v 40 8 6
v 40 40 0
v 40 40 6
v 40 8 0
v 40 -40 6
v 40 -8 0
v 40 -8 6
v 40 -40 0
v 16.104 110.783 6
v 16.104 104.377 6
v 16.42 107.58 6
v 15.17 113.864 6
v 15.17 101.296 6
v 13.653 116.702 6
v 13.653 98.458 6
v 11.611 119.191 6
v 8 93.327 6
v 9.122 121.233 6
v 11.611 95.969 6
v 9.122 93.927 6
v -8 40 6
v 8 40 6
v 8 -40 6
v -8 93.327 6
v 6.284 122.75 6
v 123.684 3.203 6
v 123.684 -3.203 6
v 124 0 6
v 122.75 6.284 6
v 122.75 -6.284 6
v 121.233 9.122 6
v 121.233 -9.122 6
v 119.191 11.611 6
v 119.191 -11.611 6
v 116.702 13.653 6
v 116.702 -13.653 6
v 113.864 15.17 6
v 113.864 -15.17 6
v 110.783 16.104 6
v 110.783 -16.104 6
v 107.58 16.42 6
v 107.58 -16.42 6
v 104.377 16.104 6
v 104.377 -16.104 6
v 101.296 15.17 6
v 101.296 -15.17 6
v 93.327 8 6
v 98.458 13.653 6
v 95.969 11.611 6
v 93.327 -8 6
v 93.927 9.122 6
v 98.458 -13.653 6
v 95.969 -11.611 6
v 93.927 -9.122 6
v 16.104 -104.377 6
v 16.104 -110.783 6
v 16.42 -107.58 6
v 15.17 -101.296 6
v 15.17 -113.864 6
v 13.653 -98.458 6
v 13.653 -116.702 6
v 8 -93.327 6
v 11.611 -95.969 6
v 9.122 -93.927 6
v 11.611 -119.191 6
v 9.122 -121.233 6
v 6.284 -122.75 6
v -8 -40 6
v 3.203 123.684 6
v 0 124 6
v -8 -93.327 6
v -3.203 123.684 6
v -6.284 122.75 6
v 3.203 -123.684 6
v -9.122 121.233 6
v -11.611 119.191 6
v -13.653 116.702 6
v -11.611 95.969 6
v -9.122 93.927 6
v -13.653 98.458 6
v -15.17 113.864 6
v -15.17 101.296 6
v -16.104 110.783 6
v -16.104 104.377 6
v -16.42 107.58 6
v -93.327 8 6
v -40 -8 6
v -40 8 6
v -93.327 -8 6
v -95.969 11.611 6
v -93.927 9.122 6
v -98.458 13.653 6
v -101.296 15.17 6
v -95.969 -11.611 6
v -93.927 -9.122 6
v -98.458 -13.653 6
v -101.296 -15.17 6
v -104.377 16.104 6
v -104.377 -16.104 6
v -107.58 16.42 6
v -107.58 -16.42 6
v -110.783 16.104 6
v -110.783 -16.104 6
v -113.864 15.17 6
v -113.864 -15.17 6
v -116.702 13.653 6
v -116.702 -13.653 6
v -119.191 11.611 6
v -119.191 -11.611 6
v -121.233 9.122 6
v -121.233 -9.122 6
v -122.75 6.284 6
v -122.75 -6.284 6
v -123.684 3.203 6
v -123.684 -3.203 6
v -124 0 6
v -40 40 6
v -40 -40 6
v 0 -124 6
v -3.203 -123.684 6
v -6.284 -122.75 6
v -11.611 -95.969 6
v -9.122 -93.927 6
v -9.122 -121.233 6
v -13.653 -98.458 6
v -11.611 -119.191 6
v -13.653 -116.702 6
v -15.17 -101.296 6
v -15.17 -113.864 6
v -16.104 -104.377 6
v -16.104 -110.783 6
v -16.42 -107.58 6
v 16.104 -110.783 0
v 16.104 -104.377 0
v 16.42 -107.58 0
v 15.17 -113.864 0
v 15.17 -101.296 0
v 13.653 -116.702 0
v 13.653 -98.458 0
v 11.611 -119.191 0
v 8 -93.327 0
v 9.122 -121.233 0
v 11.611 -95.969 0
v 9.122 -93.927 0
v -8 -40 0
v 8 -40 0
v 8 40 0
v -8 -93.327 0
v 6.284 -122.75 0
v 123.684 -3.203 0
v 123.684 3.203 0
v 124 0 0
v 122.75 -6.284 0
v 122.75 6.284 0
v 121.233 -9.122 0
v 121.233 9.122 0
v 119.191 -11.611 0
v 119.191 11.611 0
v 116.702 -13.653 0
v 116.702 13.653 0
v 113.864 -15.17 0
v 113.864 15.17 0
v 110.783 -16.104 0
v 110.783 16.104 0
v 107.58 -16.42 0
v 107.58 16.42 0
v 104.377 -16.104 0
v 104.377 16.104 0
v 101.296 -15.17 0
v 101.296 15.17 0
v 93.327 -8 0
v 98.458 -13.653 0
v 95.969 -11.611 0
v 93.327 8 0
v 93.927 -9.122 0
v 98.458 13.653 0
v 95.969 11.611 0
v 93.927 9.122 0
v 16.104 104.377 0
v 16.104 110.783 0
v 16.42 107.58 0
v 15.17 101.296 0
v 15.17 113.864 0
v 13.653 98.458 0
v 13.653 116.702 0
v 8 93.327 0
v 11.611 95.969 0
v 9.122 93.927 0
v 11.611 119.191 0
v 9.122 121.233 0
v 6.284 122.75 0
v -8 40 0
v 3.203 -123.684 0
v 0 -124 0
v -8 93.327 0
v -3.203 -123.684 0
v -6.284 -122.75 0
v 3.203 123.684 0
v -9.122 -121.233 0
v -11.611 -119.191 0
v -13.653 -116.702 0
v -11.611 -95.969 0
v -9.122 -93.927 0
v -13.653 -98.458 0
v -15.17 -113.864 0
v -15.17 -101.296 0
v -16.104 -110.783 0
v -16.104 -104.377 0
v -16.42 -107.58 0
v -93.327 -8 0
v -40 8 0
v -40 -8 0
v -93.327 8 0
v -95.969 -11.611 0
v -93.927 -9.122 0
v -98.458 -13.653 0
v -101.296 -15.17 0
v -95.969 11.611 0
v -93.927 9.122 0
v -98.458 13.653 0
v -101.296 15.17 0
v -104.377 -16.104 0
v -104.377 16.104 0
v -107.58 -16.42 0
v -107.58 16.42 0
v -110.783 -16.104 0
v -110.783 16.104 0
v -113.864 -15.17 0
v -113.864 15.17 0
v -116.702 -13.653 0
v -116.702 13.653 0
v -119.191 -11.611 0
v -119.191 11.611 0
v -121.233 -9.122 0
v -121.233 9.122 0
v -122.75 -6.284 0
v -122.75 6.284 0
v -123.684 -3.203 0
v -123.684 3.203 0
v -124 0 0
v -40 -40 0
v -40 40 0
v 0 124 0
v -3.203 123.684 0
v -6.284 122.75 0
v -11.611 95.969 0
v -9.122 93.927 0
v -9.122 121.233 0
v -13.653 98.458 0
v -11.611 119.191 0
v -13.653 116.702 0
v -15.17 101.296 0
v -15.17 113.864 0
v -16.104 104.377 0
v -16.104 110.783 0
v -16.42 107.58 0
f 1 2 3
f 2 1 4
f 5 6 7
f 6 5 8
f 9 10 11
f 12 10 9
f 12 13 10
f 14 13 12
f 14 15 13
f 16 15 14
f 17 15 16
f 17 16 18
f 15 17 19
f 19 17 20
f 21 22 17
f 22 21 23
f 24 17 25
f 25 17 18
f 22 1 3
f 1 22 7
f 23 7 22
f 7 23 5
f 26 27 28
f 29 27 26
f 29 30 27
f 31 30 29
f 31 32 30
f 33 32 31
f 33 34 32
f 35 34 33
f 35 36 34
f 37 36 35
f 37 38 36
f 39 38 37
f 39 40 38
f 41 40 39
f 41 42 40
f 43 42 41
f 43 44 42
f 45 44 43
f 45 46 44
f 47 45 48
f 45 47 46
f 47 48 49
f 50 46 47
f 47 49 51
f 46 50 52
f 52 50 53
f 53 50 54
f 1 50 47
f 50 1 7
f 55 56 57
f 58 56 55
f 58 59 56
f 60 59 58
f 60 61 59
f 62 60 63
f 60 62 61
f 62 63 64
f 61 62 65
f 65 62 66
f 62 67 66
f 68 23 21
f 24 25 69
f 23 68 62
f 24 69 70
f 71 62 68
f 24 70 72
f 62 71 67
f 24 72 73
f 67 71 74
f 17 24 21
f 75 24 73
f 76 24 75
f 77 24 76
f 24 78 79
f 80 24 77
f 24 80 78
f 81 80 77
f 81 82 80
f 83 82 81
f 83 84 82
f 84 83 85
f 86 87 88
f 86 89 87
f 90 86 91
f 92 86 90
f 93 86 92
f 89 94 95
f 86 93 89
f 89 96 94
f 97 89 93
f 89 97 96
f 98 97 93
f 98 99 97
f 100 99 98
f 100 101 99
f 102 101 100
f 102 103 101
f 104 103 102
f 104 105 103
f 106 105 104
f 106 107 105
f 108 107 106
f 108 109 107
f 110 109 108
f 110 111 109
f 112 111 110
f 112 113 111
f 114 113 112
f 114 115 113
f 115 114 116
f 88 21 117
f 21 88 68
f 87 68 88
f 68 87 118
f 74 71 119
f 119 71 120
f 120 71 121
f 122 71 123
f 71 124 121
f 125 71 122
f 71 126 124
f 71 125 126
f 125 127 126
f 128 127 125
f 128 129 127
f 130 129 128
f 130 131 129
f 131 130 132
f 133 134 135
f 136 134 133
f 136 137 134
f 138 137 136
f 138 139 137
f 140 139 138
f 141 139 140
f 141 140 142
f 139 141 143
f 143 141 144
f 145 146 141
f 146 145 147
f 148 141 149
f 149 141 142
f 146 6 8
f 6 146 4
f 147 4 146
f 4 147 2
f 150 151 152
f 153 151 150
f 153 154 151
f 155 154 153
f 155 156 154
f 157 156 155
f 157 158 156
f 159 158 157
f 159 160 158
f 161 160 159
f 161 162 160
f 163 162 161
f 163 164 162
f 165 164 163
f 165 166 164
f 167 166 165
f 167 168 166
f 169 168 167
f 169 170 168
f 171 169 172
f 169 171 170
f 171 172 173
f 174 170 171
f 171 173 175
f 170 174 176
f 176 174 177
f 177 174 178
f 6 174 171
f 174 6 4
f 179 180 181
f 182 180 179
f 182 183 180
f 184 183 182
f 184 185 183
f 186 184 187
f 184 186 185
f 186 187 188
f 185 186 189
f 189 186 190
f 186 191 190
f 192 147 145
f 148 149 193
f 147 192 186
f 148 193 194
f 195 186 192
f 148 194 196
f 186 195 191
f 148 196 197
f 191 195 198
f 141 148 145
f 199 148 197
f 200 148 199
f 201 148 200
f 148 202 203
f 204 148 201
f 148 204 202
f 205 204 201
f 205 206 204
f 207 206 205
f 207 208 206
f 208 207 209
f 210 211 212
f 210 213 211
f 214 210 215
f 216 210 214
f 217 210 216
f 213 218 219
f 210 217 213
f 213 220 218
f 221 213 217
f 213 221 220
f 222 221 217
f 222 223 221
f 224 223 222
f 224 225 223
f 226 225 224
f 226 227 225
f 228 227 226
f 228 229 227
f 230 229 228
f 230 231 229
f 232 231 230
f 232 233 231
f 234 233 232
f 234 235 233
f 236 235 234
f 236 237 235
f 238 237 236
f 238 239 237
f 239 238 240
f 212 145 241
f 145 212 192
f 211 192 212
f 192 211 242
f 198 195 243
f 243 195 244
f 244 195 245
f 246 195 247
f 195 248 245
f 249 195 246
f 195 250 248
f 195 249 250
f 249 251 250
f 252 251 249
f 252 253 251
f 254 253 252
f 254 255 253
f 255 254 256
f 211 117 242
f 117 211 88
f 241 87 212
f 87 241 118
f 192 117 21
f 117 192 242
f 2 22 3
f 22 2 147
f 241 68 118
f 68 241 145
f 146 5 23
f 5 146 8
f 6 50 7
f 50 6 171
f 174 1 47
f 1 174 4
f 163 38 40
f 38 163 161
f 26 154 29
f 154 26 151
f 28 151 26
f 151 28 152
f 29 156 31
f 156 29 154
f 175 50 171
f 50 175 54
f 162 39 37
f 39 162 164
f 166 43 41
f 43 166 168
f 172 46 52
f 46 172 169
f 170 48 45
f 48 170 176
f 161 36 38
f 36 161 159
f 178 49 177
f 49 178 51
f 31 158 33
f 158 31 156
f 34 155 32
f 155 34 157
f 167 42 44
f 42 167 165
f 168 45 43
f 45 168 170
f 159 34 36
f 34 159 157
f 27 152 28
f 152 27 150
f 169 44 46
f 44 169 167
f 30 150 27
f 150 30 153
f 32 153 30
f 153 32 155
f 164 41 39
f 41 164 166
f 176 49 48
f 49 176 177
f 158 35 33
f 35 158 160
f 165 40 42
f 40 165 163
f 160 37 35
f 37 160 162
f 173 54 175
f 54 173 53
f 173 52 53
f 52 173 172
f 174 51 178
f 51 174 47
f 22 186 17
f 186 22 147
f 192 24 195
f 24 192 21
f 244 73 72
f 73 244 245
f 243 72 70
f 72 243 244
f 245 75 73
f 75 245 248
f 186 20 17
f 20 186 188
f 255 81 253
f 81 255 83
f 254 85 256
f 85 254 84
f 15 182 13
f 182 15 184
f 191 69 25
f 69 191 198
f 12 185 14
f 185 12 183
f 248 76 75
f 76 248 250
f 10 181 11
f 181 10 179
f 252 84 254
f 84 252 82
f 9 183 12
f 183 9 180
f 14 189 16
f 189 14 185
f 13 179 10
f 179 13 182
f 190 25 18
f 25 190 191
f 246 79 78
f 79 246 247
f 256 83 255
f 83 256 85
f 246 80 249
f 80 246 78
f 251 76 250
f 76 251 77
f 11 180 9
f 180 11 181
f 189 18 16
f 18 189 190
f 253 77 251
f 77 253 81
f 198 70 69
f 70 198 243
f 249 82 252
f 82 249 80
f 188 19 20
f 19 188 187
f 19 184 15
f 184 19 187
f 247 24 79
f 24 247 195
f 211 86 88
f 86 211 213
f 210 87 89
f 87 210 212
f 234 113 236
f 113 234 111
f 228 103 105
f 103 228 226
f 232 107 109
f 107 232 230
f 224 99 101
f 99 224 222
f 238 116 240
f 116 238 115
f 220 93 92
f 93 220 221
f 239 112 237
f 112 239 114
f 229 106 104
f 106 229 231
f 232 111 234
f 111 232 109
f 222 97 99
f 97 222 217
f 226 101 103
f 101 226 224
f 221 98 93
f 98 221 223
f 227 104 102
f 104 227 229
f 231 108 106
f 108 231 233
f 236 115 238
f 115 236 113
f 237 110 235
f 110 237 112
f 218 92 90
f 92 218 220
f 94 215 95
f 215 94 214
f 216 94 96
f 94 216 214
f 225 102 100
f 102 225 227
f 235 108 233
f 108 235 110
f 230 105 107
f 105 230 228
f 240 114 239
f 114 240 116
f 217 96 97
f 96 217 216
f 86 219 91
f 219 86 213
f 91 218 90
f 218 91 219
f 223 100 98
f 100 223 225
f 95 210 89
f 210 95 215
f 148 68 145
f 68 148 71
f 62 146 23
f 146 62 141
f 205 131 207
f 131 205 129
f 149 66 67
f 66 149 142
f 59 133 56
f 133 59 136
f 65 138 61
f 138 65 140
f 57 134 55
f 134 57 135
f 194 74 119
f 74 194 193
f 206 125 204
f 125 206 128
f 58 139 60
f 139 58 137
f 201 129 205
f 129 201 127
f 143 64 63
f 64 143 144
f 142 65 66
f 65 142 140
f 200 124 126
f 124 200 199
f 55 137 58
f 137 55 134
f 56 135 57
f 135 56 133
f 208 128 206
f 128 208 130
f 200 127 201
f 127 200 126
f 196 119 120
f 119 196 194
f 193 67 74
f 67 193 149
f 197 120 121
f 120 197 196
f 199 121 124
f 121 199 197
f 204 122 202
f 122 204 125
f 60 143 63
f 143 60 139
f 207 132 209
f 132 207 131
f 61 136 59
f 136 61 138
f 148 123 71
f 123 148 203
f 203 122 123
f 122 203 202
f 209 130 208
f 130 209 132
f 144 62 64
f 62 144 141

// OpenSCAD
$fn = 32;

// ----------------------------------------------------------------------
// Quadcopter frame: 248 mm across the motor pads, arms 107.58 mm
// ----------------------------------------------------------------------

// --- parameters (mm) ---
hub = 80;                 // central plate size
plate_t = 6;              // plate thickness
arm_len = 107.58;         // hub centre to motor pad centre
bar_w = 16;               // arm width
pad_d = 32.84;            // motor pad diameter

module arm_bar() {
  /* flat bar: hull of a stub inside the hub and a box at the pad */
  hull() {
    translate([hub / 4, 0, plate_t / 2]) cube([bar_w, bar_w, plate_t], center = true);
    translate([arm_len, 0, plate_t / 2]) cube([bar_w, bar_w, plate_t], center = true);
  }
}

module pad() {
  translate([arm_len, 0, 0]) cylinder(h = plate_t, d = pad_d);
}

module frame() {
  translate([-hub / 2, -hub / 2, 0]) cube([hub, hub, plate_t]);
  rotate([0, 0, 0]) arm_bar();
  rotate([0, 0, 0]) pad();
  rotate([0, 0, 90]) arm_bar();
  rotate([0, 0, 90]) pad();
  rotate([0, 0, 180]) arm_bar();
  rotate([0, 0, 180]) pad();
  rotate([0, 0, 270]) arm_bar();
  rotate([0, 0, 270]) pad();
}

difference() {
  frame();
}
